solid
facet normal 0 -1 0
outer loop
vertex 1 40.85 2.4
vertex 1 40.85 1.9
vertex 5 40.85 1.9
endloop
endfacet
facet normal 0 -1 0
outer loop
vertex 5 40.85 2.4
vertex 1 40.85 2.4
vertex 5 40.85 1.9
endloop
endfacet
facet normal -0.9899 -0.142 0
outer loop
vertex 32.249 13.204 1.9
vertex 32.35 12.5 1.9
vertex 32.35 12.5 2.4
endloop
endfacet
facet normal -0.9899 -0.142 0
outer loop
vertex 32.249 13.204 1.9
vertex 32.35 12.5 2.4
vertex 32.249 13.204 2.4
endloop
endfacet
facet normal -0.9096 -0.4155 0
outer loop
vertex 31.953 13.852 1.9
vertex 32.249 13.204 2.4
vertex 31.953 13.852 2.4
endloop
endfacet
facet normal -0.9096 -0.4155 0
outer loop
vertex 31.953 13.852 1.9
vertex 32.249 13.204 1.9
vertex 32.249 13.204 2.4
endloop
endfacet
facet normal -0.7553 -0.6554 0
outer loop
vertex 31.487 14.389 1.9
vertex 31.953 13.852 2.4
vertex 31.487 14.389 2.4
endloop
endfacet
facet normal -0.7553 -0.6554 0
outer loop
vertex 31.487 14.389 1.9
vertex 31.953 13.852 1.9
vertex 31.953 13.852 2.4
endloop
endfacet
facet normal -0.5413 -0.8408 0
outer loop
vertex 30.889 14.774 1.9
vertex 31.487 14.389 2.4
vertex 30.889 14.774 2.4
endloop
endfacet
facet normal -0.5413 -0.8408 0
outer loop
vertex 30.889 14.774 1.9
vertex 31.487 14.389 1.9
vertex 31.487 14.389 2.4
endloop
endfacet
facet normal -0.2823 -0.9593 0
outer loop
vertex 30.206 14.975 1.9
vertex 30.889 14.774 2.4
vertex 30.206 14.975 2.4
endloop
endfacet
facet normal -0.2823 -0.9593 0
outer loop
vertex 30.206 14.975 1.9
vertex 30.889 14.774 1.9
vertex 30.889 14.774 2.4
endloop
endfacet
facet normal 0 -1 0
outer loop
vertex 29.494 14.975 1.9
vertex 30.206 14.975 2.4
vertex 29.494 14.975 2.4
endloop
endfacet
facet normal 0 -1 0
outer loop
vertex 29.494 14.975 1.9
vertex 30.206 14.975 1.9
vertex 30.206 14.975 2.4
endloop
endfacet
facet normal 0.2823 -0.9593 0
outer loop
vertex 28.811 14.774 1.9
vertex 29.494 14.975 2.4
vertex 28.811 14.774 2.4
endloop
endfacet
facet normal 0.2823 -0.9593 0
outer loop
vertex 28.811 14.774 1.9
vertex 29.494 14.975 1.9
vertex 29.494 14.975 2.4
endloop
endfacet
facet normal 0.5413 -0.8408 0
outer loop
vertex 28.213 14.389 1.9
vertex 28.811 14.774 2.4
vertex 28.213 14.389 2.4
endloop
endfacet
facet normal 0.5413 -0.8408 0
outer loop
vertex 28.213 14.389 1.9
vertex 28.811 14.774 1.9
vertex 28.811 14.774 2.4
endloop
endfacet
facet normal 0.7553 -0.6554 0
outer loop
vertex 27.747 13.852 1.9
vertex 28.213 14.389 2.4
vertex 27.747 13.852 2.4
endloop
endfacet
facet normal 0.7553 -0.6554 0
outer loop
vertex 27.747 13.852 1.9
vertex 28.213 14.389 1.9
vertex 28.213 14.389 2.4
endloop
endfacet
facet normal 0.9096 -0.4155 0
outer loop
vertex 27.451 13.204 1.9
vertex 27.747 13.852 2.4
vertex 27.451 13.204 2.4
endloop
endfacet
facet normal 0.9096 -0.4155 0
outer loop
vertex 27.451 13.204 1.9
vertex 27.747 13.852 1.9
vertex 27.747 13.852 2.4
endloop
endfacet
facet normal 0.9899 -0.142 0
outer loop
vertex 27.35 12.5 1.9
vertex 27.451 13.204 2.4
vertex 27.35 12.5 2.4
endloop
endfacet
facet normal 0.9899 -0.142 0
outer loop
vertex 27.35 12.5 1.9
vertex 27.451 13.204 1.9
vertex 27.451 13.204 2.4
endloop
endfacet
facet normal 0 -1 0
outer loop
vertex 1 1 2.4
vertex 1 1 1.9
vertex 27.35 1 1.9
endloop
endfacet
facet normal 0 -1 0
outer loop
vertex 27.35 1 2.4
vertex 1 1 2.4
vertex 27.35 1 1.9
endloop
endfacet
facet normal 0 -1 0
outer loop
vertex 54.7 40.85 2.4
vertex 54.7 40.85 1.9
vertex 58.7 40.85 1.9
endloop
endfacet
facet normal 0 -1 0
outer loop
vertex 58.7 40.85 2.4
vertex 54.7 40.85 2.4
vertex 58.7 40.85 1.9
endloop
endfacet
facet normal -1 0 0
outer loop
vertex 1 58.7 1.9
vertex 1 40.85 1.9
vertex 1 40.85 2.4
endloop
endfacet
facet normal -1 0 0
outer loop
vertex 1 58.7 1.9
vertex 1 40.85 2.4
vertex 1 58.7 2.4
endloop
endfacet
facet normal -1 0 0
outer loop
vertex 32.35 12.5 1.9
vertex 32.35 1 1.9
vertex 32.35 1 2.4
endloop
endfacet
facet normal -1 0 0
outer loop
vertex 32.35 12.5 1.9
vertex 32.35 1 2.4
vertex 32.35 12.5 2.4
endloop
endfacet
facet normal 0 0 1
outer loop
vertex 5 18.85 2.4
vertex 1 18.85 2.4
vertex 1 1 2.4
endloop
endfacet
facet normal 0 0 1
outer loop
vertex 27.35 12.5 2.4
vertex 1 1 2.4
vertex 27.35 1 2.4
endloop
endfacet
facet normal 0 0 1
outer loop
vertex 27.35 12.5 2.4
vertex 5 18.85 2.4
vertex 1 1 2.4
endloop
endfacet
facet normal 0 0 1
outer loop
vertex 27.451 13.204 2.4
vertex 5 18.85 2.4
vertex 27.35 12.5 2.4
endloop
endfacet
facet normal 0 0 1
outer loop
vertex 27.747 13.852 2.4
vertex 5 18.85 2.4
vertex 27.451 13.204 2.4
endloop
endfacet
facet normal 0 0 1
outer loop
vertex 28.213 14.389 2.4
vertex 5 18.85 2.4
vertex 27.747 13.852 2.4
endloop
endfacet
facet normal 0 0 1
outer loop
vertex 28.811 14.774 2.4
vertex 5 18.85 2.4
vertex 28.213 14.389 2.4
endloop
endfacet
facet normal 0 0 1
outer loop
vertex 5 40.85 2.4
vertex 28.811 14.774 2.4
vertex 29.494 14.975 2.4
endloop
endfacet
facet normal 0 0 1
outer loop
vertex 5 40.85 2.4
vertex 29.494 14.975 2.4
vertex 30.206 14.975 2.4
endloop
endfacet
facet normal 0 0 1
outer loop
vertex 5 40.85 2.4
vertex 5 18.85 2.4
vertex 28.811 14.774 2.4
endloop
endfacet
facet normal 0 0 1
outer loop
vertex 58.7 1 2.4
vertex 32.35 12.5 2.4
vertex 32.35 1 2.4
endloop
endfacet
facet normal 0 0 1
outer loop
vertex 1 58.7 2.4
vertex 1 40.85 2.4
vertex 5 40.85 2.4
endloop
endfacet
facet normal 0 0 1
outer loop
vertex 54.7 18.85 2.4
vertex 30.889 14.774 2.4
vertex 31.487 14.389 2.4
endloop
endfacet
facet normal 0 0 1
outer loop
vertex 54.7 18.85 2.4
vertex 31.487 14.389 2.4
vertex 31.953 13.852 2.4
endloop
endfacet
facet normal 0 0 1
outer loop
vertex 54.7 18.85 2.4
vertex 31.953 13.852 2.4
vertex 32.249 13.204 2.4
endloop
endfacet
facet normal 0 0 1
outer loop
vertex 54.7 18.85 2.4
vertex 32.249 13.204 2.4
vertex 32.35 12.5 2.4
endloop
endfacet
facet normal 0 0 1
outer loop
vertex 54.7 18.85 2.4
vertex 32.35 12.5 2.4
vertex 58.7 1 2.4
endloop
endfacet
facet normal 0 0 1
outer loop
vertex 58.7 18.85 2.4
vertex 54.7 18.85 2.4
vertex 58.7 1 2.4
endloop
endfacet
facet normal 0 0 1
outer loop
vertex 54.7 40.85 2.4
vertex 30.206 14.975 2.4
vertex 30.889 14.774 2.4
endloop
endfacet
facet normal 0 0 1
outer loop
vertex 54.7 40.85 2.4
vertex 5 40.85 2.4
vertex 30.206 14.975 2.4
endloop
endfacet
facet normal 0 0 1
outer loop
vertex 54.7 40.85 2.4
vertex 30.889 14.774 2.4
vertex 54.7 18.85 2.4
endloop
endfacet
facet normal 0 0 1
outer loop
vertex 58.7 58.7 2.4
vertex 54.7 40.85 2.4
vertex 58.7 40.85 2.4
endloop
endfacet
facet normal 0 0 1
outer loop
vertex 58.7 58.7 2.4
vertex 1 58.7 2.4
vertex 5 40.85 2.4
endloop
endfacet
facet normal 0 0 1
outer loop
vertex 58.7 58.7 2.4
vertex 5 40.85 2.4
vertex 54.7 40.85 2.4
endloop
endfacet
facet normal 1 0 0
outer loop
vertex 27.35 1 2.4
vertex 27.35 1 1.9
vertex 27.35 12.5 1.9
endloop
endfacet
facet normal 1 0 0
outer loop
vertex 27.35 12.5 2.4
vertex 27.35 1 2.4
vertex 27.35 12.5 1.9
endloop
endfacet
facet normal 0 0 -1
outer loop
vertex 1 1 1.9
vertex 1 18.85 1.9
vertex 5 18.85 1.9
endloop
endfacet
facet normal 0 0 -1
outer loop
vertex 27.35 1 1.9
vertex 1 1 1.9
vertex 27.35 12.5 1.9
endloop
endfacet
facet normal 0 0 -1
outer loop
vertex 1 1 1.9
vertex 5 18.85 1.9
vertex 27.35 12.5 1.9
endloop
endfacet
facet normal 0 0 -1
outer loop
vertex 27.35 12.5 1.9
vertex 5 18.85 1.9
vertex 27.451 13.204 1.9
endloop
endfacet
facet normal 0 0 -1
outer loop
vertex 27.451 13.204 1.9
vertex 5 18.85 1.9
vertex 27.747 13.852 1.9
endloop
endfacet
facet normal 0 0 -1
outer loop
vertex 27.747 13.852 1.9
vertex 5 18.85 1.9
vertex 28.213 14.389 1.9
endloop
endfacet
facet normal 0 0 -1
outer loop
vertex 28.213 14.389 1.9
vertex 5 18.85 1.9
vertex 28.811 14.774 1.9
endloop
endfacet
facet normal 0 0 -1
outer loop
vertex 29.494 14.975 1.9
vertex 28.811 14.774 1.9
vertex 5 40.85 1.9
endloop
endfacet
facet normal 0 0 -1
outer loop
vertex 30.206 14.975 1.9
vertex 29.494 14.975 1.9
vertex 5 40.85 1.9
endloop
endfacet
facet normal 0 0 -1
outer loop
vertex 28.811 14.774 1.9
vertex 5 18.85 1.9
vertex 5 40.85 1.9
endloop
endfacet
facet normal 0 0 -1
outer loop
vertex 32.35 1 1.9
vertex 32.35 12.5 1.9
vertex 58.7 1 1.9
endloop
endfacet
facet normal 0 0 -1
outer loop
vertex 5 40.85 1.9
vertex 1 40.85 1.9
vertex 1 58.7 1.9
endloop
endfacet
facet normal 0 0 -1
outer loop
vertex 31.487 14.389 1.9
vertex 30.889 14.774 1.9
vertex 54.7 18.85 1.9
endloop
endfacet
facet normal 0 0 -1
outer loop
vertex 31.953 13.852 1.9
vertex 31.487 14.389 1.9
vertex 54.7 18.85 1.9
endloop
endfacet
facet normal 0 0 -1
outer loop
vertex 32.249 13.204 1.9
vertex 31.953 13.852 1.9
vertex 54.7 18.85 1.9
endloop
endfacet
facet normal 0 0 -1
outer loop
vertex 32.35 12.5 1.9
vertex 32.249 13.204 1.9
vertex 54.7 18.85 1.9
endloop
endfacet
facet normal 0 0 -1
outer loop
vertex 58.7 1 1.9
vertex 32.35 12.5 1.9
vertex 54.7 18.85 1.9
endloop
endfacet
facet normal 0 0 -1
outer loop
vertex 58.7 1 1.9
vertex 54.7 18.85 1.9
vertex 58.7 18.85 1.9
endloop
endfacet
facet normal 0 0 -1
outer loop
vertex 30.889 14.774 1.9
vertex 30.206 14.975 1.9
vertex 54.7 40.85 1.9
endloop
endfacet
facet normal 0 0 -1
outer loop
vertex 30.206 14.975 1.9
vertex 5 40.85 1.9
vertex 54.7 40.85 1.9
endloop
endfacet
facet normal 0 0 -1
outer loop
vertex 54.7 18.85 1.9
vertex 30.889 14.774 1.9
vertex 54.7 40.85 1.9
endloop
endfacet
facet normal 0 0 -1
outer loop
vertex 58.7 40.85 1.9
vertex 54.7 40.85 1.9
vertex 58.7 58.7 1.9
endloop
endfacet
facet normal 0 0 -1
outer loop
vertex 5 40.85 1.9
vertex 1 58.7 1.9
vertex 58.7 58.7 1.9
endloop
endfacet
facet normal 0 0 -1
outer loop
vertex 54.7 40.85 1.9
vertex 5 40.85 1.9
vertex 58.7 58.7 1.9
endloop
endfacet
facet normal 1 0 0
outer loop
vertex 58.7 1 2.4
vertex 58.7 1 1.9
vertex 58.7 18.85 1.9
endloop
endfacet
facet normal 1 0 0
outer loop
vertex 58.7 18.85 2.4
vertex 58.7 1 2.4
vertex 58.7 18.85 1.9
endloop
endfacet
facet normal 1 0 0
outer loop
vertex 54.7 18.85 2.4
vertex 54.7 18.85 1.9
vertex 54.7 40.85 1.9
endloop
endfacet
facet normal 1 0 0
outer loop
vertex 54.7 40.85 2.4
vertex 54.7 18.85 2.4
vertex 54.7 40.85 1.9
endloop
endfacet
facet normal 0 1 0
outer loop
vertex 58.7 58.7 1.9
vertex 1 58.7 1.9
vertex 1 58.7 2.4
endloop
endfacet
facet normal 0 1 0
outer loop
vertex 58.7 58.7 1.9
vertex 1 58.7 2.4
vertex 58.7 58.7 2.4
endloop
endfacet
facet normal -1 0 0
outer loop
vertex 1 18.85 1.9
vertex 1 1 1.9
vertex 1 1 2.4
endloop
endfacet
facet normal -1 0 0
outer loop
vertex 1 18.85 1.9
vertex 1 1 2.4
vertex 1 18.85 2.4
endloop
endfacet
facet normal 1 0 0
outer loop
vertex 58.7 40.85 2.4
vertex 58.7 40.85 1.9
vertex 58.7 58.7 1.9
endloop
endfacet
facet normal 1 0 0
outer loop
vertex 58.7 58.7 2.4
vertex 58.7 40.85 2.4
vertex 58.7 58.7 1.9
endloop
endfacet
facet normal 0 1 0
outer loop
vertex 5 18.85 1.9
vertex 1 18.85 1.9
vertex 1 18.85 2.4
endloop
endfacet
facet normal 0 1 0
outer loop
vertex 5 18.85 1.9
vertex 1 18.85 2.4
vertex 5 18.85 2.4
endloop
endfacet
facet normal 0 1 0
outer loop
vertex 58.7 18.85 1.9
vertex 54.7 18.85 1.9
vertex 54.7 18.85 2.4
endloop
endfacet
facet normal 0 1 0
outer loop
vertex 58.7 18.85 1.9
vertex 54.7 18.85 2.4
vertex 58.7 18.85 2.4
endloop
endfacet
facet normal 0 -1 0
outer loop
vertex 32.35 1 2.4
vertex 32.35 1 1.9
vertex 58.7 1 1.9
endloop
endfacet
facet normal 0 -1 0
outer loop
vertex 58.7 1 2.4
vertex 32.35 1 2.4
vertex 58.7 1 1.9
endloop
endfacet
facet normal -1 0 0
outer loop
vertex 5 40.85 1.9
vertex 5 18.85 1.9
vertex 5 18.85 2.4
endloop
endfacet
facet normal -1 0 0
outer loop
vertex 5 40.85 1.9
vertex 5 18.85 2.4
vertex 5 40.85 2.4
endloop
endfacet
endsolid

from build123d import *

# Parameters (mm, degrees)
BOX024_W          = 5
BOX024_H          = 12.5
BOX024_DEPTH      = 5
CYLINDER002_R     = 2.5
CYLINDER002_DEPTH = 5
BOX005_W          = 5
BOX005_H          = 22
BOX005_DEPTH      = 1.9
BOX004_W          = 5
BOX004_H          = 22
BOX004_DEPTH      = 1.9
BOX001_W          = 57.7
BOX001_H          = 57.7
BOX001_DEPTH      = 0.5


with BuildPart() as cube:
    # Box024 → Box024 (new body)
    with BuildSketch(Plane(origin=(27.35, 0, 0), x_dir=(1, 0, 0), z_dir=(0, 0, 1))):
        with Locations((2.5, 6.25)):
            Rectangle(BOX024_W, BOX024_H)
    extrude(amount=BOX024_DEPTH)


with BuildPart() as cylinder001:
    # Cylinder002 → Cylinder002 (new body)
    with BuildSketch(Plane(origin=(29.85, 12.5, 0), x_dir=(1, 0, 0), z_dir=(0, 0, 1))):
        Circle(CYLINDER002_R)
    extrude(amount=CYLINDER002_DEPTH)


with BuildPart() as box005:
    # Box005 → Box005 (new body)
    with BuildSketch(Plane(origin=(54.7, 18.85, 1.9), x_dir=(1, 0, 0), z_dir=(0, 0, 1))):
        with Locations((2.5, 11)):
            Rectangle(BOX005_W, BOX005_H)
    extrude(amount=BOX005_DEPTH)


with BuildPart() as box004:
    # Box004 → Box004 (new body)
    with BuildSketch(Plane(origin=(0, 18.85, 1.9), x_dir=(1, 0, 0), z_dir=(0, 0, 1))):
        with Locations((2.5, 11)):
            Rectangle(BOX004_W, BOX004_H)
    extrude(amount=BOX004_DEPTH)


with BuildPart() as cut008:
    # Box001 → Box001 (new body)
    with BuildSketch(Plane(origin=(1, 1, 1.9), x_dir=(1, 0, 0), z_dir=(0, 0, 1))):
        with Locations((28.85, 28.85)):
            Rectangle(BOX001_W, BOX001_H)
    extrude(amount=BOX001_DEPTH)

    # Cut003: cut Box004
    add(box004.part, mode=Mode.SUBTRACT)

    # Cut004: cut Box005
    add(box005.part, mode=Mode.SUBTRACT)

    # Cut007: cut Cylinder001
    add(cylinder001.part, mode=Mode.SUBTRACT)

    # Cut008: cut Cube
    add(cube.part, mode=Mode.SUBTRACT)


solid = cut008.part
